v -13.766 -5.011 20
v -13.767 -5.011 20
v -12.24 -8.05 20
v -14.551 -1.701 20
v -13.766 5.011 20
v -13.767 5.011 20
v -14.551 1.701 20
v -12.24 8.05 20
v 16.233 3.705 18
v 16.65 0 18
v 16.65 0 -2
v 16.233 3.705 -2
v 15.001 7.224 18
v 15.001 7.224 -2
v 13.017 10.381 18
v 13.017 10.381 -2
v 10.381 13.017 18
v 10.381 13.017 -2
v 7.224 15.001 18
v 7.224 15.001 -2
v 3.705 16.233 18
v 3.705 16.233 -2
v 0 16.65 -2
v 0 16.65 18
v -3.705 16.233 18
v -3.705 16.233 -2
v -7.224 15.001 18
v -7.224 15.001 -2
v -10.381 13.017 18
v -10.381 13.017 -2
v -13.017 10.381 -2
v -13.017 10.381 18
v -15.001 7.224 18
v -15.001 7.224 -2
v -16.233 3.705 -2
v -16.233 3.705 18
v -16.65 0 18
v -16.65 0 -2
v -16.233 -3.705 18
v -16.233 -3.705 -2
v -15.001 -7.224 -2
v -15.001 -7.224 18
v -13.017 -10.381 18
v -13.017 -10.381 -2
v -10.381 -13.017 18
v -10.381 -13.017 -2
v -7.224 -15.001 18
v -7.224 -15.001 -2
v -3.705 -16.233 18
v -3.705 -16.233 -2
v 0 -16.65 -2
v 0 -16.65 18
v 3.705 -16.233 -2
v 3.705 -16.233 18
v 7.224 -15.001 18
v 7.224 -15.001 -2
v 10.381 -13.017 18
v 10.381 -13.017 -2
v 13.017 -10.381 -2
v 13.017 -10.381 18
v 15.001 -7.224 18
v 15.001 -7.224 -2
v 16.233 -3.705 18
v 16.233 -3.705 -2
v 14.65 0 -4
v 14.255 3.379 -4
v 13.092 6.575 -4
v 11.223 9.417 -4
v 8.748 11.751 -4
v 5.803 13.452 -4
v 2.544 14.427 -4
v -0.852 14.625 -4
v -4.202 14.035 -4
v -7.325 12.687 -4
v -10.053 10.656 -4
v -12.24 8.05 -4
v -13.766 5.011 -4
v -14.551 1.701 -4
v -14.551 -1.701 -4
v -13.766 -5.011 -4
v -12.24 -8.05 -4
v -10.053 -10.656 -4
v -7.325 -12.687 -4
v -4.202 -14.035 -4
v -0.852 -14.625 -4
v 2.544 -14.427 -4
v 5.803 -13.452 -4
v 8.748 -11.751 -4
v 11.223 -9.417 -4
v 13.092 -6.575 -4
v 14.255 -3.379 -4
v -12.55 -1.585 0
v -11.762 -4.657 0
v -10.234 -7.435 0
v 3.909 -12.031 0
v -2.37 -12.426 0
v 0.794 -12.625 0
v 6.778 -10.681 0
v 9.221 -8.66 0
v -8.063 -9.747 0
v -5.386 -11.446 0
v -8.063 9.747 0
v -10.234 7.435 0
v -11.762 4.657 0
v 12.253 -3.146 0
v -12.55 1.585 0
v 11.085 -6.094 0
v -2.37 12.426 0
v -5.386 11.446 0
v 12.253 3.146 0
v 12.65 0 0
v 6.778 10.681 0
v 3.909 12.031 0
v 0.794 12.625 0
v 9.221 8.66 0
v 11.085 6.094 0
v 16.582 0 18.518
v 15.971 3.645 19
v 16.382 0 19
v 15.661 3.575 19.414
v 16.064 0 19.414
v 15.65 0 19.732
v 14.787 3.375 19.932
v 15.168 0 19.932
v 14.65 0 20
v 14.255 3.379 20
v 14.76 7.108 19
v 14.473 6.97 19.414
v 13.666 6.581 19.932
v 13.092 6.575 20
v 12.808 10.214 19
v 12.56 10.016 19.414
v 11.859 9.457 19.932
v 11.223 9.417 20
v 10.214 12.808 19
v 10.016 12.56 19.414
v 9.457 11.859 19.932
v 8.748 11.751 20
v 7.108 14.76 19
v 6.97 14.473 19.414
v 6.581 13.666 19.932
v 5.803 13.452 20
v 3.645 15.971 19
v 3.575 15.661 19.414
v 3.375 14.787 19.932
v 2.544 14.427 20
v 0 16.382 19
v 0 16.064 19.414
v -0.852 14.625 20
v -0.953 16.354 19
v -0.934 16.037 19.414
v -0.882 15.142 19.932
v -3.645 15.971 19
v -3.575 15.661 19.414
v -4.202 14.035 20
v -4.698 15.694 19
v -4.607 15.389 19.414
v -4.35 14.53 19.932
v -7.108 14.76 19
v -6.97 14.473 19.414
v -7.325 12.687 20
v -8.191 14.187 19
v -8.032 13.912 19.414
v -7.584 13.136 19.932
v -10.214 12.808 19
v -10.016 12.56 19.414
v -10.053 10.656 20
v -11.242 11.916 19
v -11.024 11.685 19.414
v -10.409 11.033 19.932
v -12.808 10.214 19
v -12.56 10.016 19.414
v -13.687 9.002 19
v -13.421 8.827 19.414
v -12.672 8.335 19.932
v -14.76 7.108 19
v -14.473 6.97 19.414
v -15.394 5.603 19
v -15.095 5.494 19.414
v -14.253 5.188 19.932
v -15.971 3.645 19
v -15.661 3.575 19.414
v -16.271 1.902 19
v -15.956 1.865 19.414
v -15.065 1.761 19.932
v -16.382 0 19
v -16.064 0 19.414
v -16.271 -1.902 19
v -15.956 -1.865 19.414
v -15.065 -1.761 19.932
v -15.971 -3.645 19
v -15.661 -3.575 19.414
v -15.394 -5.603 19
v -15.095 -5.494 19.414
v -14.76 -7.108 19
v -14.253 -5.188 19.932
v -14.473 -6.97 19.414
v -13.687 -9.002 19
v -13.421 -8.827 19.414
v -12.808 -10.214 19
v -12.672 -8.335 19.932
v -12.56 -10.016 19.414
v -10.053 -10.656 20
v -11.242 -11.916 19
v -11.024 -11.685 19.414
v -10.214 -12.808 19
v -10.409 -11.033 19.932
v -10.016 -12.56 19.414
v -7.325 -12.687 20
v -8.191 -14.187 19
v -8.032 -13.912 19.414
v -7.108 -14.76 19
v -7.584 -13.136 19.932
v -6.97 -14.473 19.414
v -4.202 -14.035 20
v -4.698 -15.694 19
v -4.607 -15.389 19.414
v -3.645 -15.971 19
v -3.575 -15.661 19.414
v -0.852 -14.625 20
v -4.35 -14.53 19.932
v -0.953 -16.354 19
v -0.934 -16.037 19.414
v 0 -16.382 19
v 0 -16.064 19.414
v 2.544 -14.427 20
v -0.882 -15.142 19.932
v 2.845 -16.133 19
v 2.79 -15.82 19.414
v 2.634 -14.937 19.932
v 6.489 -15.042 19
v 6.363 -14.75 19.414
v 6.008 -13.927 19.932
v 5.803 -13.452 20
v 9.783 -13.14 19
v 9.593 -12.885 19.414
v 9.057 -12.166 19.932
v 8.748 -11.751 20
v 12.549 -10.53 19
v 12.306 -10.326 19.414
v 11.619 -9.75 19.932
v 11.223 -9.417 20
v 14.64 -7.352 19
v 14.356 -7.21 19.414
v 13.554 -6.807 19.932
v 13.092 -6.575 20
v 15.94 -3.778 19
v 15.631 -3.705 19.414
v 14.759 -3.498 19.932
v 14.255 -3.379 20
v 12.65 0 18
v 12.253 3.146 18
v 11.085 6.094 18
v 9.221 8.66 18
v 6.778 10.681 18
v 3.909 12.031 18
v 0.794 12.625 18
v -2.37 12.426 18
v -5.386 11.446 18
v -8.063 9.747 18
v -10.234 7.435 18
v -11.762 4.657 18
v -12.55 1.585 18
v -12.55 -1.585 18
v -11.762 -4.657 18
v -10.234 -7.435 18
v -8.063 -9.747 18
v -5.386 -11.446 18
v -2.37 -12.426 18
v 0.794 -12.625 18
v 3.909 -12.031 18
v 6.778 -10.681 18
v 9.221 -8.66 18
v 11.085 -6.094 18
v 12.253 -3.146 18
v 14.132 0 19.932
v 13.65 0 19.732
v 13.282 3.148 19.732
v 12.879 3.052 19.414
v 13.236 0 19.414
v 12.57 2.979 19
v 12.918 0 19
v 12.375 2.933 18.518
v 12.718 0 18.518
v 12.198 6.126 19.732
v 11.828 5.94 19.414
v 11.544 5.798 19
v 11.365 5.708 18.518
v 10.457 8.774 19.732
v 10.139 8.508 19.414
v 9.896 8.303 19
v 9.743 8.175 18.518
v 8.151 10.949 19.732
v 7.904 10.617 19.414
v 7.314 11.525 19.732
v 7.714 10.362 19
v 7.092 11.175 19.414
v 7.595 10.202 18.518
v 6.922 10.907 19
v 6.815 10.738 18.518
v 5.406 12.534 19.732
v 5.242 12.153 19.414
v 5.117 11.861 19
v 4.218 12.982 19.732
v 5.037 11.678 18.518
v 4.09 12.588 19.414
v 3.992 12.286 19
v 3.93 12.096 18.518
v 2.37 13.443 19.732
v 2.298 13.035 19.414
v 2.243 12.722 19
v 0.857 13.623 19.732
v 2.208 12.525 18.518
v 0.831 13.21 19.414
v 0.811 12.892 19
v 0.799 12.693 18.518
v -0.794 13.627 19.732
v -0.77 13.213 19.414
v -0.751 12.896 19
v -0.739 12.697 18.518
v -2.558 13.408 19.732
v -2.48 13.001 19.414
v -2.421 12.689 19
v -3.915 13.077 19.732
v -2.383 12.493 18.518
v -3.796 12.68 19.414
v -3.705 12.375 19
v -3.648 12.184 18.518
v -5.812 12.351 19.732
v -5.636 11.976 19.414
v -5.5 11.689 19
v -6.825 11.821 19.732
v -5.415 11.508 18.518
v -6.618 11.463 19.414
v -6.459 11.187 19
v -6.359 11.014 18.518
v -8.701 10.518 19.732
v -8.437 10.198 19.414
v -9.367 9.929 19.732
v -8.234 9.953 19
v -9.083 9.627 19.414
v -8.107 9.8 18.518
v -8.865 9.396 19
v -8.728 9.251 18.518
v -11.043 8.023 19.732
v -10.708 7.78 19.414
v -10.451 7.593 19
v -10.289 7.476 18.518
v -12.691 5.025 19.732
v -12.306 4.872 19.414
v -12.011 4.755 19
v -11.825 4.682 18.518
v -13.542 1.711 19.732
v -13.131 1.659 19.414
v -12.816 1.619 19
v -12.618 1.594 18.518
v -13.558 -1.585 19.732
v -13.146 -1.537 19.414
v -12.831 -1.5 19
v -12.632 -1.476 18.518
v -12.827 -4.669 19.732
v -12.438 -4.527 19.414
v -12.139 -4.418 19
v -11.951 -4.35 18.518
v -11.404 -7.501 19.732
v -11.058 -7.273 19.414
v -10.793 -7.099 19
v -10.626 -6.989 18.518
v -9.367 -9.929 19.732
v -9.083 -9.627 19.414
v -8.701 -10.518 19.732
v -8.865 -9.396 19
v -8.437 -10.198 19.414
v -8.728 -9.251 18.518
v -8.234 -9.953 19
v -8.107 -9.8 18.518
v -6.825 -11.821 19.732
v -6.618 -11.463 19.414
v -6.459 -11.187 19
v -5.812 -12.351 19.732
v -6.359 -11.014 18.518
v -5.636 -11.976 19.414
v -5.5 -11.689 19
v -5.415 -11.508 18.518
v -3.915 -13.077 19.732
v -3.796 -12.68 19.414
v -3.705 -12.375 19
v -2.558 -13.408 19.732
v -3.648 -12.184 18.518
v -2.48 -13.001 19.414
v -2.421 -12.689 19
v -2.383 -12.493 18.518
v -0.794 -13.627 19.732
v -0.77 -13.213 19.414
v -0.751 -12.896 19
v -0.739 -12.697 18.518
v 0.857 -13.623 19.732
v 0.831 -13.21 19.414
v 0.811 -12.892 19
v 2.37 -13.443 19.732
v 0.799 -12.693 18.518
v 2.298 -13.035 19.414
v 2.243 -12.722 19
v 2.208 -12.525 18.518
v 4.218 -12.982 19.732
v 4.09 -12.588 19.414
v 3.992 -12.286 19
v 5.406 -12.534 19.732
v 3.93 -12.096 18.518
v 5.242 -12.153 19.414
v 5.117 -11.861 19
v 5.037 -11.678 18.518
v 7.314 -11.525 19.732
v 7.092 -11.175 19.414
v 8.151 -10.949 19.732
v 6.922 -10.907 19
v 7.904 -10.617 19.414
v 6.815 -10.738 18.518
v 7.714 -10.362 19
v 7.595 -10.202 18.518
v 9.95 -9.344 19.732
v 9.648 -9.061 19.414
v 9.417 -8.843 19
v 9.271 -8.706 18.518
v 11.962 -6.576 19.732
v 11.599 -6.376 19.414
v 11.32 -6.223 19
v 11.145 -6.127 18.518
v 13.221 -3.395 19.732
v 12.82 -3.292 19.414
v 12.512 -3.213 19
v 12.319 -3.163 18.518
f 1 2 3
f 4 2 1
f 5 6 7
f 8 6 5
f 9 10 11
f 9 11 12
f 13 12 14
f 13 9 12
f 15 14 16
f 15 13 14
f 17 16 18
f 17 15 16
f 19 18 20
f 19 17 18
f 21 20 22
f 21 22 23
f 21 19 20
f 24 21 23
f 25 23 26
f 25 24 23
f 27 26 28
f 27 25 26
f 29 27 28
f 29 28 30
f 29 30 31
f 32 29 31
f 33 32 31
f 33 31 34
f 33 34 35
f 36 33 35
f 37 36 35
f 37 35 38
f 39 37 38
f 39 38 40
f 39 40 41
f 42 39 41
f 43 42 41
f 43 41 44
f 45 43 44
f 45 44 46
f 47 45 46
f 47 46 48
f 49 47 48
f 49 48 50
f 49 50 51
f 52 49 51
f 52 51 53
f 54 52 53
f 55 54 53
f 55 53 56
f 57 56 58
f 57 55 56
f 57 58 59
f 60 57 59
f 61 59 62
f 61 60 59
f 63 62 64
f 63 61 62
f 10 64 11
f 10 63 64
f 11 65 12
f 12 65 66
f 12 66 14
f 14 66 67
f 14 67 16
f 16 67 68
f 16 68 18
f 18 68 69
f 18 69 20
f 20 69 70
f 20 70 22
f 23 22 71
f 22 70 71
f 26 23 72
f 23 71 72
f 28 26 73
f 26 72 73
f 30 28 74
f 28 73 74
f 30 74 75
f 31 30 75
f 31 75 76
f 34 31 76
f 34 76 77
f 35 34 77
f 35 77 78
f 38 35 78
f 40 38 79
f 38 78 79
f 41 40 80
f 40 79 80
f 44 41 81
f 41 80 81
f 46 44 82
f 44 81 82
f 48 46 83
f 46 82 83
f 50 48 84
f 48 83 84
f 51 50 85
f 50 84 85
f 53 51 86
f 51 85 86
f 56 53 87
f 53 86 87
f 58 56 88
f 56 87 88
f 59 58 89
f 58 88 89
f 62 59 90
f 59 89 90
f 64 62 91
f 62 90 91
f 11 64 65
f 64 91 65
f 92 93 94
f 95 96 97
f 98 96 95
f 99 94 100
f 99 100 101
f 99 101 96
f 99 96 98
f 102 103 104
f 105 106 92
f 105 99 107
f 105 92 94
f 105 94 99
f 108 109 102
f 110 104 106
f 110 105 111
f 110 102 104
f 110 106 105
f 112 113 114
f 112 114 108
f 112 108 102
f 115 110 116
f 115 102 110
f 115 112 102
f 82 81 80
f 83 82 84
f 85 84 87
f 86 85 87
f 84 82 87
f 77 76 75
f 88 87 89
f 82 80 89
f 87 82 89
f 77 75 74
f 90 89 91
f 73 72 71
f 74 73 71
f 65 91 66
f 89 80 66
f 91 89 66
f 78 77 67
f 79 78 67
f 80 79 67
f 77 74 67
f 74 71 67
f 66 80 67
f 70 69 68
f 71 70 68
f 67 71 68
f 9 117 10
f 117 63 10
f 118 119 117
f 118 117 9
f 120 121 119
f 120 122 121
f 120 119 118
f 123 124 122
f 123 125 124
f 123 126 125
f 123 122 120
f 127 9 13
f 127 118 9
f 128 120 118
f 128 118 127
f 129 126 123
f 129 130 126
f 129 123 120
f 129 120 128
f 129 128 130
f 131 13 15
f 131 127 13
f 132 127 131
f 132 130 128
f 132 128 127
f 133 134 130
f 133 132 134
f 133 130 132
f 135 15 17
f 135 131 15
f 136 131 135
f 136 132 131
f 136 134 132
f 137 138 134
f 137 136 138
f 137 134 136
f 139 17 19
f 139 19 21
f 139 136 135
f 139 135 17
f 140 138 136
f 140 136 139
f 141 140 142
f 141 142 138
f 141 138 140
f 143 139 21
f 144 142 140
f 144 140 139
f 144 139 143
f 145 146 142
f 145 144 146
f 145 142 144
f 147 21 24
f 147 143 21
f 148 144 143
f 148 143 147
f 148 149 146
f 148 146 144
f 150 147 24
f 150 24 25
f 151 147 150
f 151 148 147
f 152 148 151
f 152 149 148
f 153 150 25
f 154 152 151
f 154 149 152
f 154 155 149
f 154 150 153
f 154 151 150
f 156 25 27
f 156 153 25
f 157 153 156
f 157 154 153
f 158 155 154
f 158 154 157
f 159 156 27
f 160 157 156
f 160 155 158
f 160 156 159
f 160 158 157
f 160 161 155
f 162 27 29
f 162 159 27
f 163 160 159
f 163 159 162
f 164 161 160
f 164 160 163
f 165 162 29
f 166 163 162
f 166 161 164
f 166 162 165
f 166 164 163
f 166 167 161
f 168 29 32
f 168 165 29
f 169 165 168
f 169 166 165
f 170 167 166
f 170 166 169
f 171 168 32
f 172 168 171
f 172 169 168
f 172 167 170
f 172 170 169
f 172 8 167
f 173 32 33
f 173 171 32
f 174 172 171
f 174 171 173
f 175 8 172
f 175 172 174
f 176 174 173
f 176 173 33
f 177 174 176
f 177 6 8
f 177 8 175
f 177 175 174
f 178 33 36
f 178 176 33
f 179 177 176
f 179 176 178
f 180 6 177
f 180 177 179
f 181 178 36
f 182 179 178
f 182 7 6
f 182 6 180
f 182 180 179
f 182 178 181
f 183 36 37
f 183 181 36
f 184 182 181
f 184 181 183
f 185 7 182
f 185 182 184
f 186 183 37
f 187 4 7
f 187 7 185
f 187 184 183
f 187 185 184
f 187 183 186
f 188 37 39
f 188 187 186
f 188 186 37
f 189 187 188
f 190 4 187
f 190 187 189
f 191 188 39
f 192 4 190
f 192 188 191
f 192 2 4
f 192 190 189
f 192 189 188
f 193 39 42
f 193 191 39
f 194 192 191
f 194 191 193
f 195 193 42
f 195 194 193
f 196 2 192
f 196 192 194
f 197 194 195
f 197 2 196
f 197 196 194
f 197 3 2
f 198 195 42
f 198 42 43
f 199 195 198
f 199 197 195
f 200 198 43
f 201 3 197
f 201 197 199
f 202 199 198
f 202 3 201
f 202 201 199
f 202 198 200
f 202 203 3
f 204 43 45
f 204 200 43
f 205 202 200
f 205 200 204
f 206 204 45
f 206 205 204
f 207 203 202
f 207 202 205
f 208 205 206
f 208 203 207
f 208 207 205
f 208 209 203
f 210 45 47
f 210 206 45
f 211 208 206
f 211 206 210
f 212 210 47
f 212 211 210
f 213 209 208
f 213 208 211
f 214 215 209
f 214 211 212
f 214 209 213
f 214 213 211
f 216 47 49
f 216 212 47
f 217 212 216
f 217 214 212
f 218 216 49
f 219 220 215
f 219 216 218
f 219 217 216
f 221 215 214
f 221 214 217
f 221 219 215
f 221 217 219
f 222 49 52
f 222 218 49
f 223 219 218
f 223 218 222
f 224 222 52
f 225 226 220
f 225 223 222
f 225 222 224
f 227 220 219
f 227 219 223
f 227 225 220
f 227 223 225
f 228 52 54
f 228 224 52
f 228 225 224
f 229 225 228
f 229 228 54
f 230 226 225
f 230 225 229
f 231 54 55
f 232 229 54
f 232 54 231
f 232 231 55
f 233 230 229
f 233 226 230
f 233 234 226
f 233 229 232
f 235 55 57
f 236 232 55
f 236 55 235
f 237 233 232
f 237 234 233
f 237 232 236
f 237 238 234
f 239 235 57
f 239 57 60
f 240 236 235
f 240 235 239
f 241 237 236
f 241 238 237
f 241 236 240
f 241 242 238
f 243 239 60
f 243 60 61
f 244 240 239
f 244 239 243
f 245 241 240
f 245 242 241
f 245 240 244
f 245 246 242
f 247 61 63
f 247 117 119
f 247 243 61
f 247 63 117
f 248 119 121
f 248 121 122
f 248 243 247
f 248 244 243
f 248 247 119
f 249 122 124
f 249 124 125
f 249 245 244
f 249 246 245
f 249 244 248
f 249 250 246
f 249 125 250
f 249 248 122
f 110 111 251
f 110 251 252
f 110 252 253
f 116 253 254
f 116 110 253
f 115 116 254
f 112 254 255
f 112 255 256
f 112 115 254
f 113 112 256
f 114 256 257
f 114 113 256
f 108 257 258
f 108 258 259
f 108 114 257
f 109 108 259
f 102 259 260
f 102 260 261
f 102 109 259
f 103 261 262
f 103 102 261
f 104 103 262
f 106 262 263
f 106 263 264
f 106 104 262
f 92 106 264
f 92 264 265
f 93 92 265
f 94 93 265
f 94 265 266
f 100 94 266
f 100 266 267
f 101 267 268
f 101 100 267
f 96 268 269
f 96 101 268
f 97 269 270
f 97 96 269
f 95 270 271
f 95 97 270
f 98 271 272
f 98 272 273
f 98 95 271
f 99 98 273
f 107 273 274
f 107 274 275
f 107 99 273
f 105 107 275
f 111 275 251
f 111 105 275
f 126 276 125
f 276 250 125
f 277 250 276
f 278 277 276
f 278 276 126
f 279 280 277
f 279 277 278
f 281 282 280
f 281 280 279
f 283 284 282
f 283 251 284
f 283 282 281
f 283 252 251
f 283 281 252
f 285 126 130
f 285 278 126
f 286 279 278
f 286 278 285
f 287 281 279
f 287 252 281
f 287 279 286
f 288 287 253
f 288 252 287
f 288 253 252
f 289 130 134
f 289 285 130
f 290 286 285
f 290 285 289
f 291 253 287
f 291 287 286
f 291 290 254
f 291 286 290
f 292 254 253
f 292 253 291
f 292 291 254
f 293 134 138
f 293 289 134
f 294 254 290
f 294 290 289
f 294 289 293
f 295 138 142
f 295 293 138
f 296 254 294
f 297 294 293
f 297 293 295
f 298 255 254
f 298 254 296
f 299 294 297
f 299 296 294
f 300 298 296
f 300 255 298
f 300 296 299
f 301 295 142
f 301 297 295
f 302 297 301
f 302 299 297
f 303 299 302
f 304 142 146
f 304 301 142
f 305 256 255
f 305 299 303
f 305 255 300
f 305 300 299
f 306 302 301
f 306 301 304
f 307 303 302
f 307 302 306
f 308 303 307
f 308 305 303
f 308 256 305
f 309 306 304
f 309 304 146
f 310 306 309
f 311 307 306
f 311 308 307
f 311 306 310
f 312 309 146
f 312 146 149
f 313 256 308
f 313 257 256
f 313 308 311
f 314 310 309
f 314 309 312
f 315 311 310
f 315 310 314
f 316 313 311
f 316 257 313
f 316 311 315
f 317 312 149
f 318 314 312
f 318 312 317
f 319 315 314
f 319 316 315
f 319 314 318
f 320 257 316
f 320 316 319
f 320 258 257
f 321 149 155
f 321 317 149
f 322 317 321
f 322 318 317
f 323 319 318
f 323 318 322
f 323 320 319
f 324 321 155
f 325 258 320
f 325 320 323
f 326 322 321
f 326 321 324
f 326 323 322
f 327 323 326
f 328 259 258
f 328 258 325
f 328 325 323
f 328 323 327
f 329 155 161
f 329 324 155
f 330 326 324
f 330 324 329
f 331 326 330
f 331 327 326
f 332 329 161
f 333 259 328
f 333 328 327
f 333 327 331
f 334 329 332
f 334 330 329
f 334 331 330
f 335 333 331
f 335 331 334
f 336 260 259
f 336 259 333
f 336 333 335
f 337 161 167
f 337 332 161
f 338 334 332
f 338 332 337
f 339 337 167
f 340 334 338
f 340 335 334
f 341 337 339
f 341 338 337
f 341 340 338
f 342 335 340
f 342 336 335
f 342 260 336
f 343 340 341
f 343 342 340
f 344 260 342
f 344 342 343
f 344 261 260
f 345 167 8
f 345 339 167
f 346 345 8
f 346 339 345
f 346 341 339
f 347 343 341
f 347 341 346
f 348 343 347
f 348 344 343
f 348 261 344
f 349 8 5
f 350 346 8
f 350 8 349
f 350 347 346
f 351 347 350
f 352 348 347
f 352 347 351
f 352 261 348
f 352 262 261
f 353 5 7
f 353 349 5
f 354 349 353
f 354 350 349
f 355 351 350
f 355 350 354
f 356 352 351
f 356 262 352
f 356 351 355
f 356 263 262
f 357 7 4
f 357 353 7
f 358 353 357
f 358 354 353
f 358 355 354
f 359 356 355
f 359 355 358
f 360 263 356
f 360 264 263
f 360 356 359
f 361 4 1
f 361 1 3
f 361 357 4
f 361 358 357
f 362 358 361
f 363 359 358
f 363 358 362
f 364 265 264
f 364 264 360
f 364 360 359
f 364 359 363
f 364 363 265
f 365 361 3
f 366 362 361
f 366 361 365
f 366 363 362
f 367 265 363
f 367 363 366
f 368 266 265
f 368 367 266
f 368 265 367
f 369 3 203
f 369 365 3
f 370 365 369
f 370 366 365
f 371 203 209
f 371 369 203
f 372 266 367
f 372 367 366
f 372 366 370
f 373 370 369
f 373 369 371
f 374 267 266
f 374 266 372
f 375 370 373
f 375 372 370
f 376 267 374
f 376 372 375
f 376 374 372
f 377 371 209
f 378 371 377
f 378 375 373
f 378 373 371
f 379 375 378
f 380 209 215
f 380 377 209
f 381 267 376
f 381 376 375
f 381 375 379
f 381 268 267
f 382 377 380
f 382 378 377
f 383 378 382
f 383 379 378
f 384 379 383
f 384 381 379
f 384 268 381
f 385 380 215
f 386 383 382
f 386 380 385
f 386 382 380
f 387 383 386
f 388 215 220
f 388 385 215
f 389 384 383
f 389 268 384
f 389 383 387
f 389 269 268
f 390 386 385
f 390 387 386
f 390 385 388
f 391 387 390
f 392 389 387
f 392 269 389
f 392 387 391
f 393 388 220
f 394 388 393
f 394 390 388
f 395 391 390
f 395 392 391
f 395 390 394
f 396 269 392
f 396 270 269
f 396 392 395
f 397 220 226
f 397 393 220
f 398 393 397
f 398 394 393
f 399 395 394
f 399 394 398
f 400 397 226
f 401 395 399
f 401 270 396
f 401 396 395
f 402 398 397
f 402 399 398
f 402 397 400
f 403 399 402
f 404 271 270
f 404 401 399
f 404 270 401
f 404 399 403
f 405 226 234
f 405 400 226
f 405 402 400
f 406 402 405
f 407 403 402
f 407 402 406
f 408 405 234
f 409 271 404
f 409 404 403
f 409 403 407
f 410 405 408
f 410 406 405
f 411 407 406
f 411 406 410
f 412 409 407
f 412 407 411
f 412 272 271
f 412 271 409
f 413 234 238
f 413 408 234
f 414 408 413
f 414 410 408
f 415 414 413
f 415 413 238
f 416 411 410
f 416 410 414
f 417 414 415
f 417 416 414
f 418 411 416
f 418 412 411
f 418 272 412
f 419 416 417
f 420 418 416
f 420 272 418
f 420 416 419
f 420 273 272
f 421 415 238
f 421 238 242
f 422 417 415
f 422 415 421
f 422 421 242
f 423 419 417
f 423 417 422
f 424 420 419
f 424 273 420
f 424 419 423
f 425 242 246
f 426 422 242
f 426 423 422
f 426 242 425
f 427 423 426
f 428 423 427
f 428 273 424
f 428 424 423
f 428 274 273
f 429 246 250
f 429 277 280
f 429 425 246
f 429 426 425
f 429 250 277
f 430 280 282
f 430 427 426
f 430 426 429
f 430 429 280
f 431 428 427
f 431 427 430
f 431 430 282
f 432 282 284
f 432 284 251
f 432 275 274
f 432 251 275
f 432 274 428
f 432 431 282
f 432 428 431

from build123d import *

# Parameters (mm, degrees)
F0_R     = 16.65
F0_R_2   = 12.65
F1_DEPTH = 20
F2_DEPTH = 4
F3_SIZE  = 2
F4_R     = 1.99999


# Not quite as in the source:
# - a fillet or chamfer is up to 0.001 mm smaller than in the source, because OpenCascade refuses the exact size


with BuildPart() as f1:
    # F0 (on Top) → F1 (new body)
    with BuildSketch(Plane.XY):
        Circle(F0_R)
        Circle(F0_R_2, mode=Mode.SUBTRACT)
    extrude(amount=F1_DEPTH)

    # F0 (on Top) → F2 (join)
    with BuildSketch(Plane.XY):
        Circle(F0_R)
        Circle(F0_R_2, mode=Mode.SUBTRACT)
        Circle(F0_R_2)
    extrude(amount=-F2_DEPTH)

    # F3
    f3_edges = [f1.edges().sort_by_distance(p)[0] for p in [
        (-16.65, 0, -4),
    ]]
    chamfer(f3_edges, length=F3_SIZE)

    # F4 (radius 2 in the source; OpenCascade refuses exactly that, so slightly less here)
    f4_edges = [f1.edges().sort_by_distance(p)[0] for p in [
        (-12.65, 0, 20),
        (-16.65, 0, 20),
    ]]
    fillet(f4_edges, radius=F4_R)


solid = f1.part
